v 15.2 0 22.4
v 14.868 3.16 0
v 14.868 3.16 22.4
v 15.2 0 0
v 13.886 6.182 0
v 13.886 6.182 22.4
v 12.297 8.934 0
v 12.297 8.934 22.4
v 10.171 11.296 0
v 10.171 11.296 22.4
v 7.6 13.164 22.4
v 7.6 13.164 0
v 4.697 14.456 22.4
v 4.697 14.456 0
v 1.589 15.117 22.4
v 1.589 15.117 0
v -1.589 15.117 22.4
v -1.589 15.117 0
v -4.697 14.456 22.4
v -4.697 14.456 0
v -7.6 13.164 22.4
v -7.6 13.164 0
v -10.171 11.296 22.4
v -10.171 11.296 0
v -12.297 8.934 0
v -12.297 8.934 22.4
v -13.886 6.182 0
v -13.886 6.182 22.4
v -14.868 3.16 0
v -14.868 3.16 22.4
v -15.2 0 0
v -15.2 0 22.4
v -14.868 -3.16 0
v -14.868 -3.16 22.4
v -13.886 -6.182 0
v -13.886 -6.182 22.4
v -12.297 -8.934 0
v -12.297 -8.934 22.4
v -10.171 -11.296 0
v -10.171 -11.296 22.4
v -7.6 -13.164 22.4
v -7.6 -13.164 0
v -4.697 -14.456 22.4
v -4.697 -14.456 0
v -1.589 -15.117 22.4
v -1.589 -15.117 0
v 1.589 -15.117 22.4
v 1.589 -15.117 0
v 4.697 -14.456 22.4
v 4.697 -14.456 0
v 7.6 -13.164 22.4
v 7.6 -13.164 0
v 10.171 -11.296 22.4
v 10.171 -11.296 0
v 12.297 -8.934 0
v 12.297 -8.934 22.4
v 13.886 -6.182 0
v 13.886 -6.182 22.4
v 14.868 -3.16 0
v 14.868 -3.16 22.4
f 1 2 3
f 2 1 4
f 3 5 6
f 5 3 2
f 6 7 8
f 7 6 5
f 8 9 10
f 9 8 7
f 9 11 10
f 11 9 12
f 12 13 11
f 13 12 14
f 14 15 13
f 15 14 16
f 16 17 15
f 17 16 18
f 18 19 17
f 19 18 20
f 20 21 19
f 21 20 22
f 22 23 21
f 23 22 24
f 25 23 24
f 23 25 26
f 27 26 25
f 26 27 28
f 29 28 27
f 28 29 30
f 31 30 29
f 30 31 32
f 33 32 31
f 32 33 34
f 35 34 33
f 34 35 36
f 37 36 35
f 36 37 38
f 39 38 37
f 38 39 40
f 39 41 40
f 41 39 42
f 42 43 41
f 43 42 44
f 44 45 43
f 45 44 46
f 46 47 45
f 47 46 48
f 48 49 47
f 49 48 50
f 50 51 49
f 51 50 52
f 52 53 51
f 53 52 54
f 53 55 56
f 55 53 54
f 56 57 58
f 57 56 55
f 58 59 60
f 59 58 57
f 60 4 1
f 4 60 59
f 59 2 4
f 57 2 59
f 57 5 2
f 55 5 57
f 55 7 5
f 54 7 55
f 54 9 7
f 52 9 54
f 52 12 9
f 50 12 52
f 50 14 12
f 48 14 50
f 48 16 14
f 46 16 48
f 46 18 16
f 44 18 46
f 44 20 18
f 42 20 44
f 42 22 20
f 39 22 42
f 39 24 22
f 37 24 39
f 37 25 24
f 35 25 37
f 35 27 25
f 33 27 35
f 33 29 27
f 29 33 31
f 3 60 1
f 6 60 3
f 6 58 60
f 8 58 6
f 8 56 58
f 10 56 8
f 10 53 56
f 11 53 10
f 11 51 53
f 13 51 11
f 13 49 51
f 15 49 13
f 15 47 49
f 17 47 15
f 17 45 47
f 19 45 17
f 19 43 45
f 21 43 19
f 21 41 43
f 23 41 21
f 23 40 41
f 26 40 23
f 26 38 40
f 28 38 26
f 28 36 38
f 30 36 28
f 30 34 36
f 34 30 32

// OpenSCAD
// file: ../Tolerance.scad
function LaserCutTolerance() = .02;
function 3dPrinterTolerance() = .4;
// main file
use <../Tolerance.scad>

function PullyBodyWidth(3dPrinterTolerance=.4) = 22 + 3dPrinterTolerance;
function PullyDiam(3dPrinterTolerance=.4) = 30 + 3dPrinterTolerance;

module Pully(3dPrinterTolerance=.4)
{
	cylinder(PullyBodyWidth(3dPrinterTolerance), PullyDiam(3dPrinterTolerance)/2, PullyDiam(3dPrinterTolerance)/2);
}

Pully();
